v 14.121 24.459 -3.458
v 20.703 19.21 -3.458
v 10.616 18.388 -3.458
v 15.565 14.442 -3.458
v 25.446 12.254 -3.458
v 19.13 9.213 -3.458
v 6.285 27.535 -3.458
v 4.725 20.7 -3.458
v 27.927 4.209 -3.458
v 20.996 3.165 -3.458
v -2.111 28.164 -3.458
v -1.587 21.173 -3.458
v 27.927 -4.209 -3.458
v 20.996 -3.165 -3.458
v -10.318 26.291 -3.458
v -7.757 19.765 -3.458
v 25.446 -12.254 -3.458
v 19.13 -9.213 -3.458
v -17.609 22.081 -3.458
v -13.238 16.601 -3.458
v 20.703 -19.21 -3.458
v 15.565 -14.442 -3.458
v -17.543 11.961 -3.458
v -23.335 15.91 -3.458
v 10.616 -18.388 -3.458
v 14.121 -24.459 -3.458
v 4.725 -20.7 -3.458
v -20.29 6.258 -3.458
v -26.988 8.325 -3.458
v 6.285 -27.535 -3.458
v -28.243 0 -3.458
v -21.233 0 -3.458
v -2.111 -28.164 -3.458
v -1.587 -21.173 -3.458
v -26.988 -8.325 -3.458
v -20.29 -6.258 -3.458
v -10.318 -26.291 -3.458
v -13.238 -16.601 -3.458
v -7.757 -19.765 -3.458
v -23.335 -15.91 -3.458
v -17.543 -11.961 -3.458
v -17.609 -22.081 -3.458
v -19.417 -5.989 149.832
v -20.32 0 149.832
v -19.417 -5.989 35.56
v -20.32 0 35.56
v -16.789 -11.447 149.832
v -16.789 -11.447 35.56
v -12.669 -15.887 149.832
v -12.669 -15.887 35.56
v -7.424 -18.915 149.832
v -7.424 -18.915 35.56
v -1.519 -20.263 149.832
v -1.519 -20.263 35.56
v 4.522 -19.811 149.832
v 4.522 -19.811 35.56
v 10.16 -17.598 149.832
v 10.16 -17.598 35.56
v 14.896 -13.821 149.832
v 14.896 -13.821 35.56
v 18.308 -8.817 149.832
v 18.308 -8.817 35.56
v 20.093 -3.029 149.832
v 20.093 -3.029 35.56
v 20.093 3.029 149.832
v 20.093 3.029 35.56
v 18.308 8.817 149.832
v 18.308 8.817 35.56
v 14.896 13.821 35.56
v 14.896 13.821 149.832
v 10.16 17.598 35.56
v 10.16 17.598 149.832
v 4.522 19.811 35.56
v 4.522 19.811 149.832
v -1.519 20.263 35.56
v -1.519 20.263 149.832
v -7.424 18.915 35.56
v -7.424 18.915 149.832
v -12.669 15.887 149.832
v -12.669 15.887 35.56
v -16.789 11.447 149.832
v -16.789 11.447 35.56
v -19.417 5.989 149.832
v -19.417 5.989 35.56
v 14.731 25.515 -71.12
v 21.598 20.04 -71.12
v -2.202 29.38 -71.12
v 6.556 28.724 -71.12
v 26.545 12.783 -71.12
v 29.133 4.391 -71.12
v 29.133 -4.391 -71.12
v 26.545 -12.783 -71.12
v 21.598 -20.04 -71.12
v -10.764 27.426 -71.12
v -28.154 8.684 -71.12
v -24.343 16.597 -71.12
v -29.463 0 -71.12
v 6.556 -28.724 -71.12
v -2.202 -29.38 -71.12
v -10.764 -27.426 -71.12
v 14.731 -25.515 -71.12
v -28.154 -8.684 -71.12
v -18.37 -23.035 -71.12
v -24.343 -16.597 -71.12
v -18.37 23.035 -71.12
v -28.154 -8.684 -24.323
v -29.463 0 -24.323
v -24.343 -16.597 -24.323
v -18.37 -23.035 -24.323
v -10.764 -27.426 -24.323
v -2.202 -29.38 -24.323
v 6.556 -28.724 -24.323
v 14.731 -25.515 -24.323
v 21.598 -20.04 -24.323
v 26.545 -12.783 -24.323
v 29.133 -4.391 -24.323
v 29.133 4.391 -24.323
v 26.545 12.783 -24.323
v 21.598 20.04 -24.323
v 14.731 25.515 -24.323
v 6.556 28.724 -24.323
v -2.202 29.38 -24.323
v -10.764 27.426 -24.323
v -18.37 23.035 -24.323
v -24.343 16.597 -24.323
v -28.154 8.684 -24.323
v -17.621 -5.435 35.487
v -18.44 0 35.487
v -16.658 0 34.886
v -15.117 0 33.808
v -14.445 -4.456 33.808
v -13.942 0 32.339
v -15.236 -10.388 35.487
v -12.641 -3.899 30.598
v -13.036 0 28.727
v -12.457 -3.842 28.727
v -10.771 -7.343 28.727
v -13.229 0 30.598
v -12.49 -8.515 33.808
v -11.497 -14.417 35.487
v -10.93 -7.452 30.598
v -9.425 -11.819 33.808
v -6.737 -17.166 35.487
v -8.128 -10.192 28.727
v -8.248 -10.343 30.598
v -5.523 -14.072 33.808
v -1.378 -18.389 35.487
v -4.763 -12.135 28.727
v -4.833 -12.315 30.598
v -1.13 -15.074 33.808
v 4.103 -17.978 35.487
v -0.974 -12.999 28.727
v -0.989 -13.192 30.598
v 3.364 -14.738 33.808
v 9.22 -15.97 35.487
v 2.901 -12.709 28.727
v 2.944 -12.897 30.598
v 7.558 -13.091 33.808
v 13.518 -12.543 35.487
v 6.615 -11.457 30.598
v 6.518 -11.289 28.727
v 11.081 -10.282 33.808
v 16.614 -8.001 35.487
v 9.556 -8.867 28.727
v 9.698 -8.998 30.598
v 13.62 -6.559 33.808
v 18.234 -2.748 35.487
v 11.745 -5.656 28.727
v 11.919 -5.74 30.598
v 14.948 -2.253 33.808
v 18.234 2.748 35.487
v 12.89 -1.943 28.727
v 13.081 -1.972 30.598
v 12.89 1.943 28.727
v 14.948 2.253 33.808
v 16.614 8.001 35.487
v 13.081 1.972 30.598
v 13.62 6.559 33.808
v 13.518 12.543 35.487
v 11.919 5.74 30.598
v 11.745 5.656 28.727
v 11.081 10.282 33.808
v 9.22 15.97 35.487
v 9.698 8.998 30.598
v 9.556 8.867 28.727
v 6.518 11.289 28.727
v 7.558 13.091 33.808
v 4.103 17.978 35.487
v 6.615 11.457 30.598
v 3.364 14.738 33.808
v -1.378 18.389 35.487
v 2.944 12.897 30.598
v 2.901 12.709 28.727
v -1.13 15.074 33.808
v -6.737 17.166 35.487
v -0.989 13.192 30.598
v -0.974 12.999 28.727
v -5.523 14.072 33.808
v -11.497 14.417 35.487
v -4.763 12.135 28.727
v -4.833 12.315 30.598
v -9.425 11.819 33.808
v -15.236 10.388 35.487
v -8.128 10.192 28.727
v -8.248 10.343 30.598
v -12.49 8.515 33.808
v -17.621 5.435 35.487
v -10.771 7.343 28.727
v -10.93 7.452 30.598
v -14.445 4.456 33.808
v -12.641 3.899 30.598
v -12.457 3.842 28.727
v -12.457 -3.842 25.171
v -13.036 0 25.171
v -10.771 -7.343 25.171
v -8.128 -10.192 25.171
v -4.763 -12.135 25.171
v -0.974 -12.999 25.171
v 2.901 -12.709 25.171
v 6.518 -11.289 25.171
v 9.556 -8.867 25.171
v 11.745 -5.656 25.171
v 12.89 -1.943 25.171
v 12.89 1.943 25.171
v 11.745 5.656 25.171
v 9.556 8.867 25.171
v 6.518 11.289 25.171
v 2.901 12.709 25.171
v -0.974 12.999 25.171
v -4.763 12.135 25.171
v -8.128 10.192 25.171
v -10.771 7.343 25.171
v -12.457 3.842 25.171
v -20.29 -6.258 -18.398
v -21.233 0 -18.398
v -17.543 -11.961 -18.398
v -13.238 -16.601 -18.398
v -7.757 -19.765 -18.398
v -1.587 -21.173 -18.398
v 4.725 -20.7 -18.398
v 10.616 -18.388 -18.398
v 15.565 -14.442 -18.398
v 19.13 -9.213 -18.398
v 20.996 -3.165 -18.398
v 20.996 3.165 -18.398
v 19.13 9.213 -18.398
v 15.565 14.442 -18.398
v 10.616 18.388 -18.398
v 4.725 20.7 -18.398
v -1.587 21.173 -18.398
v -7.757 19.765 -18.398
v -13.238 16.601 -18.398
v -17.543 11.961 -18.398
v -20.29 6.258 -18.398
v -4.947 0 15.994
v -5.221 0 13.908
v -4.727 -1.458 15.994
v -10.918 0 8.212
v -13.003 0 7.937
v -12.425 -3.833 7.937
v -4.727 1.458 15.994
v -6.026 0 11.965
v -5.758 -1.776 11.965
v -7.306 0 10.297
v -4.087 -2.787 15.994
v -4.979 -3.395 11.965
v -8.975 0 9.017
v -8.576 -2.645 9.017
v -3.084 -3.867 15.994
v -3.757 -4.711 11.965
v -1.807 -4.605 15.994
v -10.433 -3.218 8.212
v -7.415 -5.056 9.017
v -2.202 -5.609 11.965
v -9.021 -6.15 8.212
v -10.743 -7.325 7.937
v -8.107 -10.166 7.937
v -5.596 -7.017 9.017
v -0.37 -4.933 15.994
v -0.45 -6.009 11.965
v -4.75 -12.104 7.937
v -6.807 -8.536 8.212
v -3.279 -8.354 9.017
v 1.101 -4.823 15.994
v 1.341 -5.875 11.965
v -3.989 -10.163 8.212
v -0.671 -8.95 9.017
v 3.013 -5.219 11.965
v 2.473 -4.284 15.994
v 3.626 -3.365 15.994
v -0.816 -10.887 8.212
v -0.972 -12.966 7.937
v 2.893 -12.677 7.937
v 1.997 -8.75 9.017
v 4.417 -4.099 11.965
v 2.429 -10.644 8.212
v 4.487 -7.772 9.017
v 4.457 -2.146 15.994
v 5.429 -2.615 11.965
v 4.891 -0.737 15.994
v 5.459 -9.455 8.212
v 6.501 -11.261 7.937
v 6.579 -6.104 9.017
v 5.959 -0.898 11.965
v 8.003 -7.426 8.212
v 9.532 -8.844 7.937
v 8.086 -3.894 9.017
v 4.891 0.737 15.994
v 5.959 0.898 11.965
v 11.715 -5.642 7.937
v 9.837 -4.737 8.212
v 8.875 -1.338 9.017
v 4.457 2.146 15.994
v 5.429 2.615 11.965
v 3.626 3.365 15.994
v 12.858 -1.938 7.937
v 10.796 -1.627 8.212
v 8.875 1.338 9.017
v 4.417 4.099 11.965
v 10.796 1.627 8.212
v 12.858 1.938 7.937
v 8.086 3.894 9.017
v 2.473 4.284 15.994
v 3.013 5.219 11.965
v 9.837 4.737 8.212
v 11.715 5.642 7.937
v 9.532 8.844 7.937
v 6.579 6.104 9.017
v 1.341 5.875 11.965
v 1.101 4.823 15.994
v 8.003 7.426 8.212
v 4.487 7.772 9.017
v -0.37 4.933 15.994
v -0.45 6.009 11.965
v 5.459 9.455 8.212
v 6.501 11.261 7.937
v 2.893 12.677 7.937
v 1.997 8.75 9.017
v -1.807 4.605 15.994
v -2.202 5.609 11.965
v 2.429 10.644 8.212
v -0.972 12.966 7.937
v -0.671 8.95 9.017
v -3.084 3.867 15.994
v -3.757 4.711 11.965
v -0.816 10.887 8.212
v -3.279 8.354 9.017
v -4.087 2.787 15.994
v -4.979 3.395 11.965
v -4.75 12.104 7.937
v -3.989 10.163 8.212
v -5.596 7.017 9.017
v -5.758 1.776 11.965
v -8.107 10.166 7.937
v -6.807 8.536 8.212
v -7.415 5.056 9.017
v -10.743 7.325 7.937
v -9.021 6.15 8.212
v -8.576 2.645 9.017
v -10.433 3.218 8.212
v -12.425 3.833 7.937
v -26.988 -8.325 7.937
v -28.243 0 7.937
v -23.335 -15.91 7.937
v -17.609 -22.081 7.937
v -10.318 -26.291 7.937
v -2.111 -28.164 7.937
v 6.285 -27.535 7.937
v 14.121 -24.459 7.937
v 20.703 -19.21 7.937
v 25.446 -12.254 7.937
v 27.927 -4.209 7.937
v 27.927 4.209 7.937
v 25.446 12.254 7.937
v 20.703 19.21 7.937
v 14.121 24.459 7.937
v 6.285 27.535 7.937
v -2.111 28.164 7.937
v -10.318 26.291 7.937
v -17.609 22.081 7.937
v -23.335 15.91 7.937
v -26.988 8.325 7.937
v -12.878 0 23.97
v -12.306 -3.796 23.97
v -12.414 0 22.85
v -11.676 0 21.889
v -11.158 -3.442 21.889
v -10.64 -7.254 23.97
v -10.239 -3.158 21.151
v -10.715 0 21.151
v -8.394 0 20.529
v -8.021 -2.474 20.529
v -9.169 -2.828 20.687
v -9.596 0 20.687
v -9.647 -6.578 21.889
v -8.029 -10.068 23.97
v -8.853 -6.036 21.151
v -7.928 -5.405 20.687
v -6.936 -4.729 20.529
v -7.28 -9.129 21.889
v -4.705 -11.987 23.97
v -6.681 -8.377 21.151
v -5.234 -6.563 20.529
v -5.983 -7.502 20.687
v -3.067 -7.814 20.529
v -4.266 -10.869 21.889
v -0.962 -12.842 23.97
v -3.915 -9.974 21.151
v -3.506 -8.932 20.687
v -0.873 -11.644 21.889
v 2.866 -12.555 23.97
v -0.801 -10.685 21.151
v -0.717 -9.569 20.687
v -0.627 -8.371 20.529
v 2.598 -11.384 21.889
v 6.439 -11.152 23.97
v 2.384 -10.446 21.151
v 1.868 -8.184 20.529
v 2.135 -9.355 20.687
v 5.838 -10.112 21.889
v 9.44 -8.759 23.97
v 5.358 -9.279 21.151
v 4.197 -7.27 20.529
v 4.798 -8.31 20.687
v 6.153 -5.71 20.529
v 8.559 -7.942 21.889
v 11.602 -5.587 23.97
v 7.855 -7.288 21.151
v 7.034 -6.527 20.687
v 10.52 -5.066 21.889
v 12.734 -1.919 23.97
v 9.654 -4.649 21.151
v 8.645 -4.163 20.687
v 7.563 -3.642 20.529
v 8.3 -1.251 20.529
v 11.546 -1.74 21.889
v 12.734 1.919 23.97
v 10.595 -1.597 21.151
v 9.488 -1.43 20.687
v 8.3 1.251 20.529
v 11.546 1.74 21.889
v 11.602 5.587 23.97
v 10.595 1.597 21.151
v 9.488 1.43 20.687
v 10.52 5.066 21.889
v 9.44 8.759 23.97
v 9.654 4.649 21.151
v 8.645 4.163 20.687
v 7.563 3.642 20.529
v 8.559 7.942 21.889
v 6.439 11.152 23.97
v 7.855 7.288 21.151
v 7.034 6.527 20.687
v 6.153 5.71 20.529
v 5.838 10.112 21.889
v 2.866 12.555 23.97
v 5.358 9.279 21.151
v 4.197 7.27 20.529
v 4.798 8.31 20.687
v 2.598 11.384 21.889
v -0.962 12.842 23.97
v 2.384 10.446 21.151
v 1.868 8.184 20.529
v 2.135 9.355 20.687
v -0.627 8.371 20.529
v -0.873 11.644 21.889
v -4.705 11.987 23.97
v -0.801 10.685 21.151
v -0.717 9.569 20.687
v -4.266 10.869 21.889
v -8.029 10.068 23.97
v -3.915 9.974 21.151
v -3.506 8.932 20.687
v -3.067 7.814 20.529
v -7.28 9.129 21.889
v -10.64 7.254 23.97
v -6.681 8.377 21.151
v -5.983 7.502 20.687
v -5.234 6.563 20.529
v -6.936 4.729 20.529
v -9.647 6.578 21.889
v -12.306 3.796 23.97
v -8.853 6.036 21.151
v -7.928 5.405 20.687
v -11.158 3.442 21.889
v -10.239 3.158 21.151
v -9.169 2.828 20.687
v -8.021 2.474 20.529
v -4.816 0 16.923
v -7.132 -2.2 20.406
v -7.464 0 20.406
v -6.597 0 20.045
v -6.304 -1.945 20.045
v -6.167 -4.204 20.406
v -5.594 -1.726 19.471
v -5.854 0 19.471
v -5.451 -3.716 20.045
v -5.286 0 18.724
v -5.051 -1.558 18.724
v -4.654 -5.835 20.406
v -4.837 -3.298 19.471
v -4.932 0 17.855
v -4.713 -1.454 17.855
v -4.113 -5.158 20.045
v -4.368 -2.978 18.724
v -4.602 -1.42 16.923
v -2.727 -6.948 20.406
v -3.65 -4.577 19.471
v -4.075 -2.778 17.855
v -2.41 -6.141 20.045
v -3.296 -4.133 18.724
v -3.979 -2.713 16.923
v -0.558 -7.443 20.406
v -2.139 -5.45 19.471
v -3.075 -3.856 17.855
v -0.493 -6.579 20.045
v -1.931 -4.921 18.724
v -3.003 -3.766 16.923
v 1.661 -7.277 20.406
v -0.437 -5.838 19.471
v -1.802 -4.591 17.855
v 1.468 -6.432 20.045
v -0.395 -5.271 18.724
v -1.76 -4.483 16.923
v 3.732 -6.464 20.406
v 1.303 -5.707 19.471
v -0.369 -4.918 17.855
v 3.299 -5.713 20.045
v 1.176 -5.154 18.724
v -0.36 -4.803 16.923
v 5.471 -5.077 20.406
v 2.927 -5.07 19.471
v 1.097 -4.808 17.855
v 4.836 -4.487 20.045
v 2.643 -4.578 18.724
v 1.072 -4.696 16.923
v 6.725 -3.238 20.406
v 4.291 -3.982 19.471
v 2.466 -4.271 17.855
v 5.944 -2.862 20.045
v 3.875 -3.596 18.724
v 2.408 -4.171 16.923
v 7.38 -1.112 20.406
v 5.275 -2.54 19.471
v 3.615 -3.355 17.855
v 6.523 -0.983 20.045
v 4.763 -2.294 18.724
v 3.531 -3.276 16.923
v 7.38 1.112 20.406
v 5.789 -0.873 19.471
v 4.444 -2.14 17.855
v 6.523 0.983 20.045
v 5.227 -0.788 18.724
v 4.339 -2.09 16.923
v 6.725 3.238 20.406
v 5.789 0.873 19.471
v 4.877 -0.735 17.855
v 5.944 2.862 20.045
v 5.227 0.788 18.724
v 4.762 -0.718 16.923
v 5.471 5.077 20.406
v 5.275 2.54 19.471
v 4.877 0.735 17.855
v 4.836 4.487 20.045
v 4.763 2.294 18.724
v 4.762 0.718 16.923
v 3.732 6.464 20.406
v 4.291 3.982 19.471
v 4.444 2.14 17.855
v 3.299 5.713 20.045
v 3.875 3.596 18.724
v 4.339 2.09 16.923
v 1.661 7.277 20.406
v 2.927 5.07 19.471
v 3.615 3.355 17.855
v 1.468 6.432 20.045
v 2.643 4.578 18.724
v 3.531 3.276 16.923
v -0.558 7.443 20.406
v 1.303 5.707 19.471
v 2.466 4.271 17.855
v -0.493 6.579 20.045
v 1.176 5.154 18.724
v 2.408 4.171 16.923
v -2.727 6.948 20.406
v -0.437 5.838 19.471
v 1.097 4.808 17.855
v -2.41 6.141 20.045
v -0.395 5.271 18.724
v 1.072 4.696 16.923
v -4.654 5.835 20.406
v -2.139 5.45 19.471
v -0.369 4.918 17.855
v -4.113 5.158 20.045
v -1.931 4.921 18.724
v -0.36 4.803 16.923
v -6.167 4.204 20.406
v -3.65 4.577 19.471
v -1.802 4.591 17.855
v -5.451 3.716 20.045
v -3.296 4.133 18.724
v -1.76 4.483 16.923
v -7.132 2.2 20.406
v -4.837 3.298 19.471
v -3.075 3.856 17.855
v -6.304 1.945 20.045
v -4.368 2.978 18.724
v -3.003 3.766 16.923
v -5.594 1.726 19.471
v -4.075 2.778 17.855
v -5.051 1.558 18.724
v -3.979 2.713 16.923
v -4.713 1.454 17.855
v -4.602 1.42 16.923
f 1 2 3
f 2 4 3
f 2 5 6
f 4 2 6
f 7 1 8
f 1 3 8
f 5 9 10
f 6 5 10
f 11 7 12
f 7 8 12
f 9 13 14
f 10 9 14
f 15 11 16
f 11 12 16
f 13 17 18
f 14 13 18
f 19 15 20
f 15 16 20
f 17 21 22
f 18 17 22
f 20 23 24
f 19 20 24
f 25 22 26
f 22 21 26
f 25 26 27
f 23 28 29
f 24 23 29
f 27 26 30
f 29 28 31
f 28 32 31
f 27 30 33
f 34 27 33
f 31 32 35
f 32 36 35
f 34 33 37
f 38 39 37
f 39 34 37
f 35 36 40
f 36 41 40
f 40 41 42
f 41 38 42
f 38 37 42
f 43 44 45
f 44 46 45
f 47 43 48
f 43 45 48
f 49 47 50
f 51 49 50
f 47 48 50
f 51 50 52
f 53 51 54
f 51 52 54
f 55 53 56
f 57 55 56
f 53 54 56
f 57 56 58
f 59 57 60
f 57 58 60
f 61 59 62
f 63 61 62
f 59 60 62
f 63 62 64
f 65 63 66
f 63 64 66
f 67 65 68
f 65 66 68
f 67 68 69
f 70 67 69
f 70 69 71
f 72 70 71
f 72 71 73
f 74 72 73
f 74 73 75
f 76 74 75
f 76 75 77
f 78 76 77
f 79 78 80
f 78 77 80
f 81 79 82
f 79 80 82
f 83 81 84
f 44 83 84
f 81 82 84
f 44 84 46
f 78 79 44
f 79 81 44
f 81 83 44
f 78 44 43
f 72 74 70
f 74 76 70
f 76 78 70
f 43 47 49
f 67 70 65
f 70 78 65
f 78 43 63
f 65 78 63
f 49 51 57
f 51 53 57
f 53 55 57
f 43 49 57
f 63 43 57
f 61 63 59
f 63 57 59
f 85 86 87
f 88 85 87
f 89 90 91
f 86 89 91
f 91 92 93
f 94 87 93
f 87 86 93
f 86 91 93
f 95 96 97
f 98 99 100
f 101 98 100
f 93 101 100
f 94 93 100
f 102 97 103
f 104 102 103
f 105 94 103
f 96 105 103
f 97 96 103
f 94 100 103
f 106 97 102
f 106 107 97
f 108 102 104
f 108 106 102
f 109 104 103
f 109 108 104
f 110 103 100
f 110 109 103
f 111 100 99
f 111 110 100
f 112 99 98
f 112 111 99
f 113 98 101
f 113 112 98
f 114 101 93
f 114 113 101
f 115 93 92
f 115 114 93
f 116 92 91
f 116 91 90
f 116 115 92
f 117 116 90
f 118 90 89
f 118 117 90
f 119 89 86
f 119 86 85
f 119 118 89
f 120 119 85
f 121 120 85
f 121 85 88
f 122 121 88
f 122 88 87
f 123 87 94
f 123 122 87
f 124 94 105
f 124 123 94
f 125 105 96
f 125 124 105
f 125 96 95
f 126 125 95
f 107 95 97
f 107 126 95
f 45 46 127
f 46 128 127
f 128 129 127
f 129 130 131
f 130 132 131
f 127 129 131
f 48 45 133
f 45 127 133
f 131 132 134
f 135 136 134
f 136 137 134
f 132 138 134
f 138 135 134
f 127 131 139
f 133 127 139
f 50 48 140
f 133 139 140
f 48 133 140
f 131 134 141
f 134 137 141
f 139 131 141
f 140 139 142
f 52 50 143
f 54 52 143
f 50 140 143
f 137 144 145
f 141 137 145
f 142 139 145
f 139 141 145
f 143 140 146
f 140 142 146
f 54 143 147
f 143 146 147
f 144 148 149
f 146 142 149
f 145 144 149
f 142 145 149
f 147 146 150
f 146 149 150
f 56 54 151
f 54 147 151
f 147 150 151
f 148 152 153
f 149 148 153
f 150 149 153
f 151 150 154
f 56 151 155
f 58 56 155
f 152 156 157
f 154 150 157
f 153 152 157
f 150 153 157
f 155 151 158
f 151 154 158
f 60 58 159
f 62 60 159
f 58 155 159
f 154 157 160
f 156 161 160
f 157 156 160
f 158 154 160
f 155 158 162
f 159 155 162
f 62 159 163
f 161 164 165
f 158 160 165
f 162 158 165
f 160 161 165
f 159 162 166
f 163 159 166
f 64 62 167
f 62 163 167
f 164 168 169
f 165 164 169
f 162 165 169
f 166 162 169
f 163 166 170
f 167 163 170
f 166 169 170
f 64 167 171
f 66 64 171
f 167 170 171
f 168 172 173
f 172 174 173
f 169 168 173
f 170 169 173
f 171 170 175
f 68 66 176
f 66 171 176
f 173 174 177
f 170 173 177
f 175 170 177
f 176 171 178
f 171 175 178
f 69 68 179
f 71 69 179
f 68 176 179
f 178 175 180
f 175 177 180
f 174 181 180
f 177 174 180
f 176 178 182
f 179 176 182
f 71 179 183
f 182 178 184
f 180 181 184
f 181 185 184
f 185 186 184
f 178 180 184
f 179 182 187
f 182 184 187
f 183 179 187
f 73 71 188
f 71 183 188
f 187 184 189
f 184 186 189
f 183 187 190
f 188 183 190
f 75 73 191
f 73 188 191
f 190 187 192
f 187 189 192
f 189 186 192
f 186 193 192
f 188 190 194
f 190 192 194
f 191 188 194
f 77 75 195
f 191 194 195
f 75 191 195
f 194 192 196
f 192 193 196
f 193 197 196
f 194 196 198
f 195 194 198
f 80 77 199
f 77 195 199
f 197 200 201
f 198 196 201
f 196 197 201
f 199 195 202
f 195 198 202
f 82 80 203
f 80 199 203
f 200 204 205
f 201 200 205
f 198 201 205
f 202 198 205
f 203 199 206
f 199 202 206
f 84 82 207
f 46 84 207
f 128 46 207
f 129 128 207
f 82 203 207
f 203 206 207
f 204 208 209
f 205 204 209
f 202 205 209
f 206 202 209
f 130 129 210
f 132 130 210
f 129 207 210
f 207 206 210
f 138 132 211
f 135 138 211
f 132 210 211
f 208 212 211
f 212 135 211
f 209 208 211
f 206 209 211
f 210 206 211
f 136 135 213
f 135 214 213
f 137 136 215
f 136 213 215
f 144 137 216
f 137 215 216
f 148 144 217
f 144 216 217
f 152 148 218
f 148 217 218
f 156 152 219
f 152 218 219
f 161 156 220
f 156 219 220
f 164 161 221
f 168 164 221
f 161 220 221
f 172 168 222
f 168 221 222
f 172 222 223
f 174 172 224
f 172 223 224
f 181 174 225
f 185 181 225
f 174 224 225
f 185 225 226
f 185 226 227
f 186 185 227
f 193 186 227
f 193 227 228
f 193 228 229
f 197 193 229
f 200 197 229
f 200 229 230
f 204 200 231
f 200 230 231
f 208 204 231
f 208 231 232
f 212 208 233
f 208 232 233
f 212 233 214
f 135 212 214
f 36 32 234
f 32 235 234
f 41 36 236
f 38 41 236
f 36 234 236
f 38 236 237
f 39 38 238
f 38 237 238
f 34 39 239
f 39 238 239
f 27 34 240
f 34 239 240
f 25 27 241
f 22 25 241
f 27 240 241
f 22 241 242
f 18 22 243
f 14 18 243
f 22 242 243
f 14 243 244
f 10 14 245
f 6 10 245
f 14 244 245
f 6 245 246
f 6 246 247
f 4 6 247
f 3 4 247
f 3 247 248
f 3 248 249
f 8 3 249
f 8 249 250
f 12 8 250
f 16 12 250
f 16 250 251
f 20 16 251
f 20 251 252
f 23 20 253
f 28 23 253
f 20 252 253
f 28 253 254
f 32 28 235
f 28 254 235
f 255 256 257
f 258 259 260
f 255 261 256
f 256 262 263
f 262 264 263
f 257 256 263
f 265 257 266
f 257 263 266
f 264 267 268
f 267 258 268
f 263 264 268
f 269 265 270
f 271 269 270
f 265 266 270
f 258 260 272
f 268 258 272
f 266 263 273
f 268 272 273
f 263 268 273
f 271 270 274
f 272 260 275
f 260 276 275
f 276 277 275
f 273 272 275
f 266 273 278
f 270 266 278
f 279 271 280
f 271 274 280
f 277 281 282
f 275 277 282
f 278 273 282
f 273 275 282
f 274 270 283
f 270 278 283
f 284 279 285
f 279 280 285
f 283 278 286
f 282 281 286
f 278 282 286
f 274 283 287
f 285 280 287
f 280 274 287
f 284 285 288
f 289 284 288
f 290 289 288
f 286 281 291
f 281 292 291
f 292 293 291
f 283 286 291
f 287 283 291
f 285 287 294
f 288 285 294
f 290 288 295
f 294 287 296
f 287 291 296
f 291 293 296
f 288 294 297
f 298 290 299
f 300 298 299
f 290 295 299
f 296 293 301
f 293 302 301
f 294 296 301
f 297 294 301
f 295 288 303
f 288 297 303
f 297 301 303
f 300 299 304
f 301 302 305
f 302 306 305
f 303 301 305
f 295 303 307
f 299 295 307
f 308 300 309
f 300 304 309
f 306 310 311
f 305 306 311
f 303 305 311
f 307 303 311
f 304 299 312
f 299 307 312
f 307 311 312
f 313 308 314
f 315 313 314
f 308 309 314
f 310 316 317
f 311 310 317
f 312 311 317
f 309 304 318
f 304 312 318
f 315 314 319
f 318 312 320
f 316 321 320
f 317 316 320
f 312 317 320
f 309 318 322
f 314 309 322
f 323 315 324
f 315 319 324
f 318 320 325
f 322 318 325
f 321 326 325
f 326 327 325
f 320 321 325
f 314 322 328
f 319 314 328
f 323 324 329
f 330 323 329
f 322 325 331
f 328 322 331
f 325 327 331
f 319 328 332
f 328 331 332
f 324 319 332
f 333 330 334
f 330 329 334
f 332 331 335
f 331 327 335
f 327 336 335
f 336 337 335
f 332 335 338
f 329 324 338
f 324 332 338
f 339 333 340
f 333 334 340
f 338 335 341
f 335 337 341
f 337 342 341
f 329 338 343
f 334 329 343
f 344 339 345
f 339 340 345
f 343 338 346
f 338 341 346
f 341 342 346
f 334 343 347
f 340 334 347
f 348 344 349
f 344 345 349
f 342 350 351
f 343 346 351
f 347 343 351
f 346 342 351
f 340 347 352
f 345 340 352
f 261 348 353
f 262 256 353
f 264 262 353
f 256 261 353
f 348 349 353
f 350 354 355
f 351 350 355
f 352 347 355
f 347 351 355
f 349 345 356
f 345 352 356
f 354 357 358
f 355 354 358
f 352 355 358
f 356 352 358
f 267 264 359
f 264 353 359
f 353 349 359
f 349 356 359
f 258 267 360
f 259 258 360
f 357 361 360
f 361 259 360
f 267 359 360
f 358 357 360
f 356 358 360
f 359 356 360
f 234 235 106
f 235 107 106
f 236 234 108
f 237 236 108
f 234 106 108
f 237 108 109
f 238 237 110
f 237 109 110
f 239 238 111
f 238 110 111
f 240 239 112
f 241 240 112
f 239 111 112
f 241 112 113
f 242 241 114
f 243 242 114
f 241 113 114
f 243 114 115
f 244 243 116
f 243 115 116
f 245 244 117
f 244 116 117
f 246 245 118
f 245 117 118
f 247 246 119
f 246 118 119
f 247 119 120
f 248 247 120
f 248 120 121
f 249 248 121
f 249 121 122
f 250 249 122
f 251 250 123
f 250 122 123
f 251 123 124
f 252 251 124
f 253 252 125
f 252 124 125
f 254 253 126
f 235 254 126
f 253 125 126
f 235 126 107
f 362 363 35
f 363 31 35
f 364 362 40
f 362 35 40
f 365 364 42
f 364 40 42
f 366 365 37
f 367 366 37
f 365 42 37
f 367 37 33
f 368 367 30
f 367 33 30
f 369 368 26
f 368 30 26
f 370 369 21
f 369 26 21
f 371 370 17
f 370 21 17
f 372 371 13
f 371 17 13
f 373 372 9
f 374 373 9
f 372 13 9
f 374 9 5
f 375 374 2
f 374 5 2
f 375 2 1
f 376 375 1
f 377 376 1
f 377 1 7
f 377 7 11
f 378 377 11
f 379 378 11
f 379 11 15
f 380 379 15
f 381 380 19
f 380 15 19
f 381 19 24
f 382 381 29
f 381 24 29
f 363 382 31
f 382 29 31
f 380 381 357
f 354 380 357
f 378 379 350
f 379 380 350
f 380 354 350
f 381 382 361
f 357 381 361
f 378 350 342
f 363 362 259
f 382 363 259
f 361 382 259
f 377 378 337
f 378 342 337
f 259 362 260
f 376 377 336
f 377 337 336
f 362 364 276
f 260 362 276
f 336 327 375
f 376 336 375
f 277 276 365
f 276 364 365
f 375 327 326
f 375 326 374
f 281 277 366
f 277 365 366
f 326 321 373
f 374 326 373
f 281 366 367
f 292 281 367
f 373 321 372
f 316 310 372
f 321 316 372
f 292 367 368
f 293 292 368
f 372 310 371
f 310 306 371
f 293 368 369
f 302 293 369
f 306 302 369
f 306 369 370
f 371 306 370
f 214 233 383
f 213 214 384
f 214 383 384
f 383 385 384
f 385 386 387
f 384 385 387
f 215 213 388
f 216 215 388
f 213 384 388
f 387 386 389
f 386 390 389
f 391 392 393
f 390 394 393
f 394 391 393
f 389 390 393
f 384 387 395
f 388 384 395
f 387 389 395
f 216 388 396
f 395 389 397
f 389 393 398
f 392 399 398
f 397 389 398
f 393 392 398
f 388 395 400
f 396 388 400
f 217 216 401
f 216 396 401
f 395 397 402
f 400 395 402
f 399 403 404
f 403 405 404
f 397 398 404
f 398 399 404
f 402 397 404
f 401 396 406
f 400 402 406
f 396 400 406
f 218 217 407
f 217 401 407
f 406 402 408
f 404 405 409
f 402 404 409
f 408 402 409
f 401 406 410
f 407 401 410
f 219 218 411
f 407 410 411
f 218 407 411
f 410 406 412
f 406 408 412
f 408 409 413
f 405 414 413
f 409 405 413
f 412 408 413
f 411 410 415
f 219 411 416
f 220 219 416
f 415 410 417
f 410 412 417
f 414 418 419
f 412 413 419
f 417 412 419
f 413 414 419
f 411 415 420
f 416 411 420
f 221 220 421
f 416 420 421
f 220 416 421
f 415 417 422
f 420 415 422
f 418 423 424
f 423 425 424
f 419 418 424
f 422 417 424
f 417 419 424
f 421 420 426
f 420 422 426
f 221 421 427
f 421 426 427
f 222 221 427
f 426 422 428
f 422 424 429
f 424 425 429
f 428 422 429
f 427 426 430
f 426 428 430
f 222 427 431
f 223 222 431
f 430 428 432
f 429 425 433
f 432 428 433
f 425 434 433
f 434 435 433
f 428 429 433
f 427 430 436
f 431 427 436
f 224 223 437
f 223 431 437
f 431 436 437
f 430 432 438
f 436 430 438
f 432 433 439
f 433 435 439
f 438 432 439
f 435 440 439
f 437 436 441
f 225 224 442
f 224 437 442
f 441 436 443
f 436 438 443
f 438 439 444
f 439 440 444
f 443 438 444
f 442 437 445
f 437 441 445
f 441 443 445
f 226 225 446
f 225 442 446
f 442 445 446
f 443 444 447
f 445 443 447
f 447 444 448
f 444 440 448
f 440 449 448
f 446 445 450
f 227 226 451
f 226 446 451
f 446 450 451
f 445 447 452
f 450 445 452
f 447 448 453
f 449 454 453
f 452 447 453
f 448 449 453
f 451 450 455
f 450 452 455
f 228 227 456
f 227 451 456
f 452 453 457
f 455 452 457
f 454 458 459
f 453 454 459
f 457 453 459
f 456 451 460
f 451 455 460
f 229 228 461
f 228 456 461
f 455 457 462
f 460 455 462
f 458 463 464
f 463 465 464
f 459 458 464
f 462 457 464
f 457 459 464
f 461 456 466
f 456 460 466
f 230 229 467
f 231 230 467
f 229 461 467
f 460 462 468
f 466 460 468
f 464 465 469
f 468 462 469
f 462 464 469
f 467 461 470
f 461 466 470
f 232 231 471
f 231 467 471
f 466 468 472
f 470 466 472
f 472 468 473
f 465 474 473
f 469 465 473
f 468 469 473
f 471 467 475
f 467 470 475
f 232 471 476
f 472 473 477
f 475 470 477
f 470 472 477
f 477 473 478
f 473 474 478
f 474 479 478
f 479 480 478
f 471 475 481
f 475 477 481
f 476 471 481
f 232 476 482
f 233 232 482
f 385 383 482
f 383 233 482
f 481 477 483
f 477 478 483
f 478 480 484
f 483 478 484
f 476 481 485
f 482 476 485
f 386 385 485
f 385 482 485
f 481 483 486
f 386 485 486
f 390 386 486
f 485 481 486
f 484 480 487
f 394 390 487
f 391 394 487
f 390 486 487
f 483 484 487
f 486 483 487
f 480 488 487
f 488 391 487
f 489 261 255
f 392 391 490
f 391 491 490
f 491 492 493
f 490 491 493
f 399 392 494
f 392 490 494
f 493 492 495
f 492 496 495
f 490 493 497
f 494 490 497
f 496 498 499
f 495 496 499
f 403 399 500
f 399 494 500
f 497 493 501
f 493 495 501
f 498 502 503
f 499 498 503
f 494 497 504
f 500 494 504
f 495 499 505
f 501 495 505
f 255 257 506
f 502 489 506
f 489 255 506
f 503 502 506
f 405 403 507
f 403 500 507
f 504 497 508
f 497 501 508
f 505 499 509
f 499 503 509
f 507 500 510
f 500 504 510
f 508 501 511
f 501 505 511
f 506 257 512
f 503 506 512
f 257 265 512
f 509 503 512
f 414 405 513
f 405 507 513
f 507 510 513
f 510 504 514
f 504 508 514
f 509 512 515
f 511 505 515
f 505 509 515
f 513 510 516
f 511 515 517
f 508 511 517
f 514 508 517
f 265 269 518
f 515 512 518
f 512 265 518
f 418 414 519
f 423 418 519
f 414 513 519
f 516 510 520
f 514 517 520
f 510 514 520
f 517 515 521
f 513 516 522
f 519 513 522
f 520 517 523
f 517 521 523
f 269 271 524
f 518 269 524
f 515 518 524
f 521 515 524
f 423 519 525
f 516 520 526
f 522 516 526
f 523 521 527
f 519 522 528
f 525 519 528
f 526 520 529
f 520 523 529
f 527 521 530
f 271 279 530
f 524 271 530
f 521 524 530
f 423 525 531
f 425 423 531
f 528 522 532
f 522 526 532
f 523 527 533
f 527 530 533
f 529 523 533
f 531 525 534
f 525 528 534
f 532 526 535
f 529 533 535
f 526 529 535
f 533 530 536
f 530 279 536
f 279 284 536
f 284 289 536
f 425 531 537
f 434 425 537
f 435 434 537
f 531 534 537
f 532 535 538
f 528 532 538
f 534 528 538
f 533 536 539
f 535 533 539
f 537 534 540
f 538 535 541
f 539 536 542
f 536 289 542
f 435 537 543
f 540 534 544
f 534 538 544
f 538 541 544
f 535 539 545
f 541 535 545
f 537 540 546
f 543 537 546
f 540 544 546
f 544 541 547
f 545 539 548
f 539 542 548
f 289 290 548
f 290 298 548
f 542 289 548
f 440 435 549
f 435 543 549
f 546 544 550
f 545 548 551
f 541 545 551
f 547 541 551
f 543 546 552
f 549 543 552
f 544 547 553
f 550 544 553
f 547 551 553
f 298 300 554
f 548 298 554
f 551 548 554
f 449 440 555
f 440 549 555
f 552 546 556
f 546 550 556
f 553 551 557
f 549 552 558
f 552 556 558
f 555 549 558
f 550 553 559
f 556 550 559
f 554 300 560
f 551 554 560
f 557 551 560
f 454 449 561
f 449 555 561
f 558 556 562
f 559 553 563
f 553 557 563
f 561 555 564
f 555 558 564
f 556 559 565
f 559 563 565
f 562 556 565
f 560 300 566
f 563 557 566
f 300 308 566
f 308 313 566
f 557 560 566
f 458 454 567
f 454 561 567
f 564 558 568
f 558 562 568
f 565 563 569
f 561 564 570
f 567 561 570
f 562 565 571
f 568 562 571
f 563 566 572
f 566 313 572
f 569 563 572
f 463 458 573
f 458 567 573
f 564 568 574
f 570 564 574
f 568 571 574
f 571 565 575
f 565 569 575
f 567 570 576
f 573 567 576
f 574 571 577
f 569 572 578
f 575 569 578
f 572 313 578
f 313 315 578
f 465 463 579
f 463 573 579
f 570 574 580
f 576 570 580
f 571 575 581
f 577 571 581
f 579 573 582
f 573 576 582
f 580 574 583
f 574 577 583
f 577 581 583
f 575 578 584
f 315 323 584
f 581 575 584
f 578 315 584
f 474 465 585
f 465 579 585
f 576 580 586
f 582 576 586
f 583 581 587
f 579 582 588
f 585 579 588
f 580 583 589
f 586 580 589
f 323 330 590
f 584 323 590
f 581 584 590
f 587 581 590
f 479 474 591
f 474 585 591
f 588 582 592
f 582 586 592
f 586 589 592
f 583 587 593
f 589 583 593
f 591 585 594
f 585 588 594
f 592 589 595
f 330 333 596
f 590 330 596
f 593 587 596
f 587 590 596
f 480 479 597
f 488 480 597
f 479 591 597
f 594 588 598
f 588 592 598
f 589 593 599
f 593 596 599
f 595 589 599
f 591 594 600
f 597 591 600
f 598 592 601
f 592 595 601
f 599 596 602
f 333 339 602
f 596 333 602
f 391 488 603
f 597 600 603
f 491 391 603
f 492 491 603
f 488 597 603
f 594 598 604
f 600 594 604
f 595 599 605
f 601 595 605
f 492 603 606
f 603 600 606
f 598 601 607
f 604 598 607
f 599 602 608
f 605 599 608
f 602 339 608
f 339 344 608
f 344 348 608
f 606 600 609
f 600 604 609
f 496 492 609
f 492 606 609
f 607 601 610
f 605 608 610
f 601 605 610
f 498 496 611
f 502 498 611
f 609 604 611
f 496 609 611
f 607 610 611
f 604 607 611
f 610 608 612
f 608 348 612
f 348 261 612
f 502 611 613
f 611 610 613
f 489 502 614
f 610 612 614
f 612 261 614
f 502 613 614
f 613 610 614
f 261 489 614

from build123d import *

# Parameters (mm, degrees)
F2_DEPTH = 104.11185
F3_DEPTH = 25.4


with BuildPart() as f1:
    # F0 (on Front) → F1 (revolve)
    with BuildSketch(Plane.XZ):
        with BuildLine():
            Line((0, -45.72), (0, 0))
            Line((0, 0), (0, 45.72))
            Line((0, 45.72), (-20.32, 45.72))
            Line((-20.32, 45.72), (-20.32, 35.56))
            ThreePointArc((-20.32, 35.56), (-15.1165623924, 33.8078630493), (-13.0358416779, 28.7268839961))
            Line((-13.0358416779, 28.7268839961), (-13.0358416779, 25.1708839961))
            ThreePointArc((-13.0358416779, 25.1708839961), (-11.6763486852, 21.8887775753), (-8.3942422643, 20.5292845826))
            ThreePointArc((-8.3942422643, 20.5292845826), (-5.5456340699, 19.1163985733), (-4.9467060106, 15.9935632109))
            ThreePointArc((-4.9467060106, 15.9935632109), (-7.3062957159, 10.2970097428), (-13.002849184, 7.9374200376))
            Line((-13.002849184, 7.9374200376), (-28.242849184, 7.9374200376))
            Line((-28.242849184, 7.9374200376), (-28.242849184, -3.4583220258))
            Line((-28.242849184, -3.4583220258), (-21.2328514445, -3.4583220258))
            Line((-21.2328514445, -3.4583220258), (-21.2328514445, -18.3975605232))
            Line((-21.2328514445, -18.3975605232), (-29.4625001389, -24.3229104143))
            Line((-29.4625001389, -24.3229104143), (-29.4625001389, -45.72))
            Line((-29.4625001389, -45.72), (0, -45.72))
        make_face()
    revolve(axis=Axis((0, 0, 22.86), (0, 0, 1)))

    # F2 (add): a face of the model
    f2_faces = [f1.faces().sort_by_distance(p)[0] for p in [
        (0, 0, 45.72),
    ]]
    extrude(f2_faces, amount=F2_DEPTH)

    # F3 (add): a face of the model
    f3_faces = [f1.faces().sort_by_distance(p)[0] for p in [
        (0, 0, -45.72),
    ]]
    extrude(f3_faces, amount=F3_DEPTH)


solid = f1.part
